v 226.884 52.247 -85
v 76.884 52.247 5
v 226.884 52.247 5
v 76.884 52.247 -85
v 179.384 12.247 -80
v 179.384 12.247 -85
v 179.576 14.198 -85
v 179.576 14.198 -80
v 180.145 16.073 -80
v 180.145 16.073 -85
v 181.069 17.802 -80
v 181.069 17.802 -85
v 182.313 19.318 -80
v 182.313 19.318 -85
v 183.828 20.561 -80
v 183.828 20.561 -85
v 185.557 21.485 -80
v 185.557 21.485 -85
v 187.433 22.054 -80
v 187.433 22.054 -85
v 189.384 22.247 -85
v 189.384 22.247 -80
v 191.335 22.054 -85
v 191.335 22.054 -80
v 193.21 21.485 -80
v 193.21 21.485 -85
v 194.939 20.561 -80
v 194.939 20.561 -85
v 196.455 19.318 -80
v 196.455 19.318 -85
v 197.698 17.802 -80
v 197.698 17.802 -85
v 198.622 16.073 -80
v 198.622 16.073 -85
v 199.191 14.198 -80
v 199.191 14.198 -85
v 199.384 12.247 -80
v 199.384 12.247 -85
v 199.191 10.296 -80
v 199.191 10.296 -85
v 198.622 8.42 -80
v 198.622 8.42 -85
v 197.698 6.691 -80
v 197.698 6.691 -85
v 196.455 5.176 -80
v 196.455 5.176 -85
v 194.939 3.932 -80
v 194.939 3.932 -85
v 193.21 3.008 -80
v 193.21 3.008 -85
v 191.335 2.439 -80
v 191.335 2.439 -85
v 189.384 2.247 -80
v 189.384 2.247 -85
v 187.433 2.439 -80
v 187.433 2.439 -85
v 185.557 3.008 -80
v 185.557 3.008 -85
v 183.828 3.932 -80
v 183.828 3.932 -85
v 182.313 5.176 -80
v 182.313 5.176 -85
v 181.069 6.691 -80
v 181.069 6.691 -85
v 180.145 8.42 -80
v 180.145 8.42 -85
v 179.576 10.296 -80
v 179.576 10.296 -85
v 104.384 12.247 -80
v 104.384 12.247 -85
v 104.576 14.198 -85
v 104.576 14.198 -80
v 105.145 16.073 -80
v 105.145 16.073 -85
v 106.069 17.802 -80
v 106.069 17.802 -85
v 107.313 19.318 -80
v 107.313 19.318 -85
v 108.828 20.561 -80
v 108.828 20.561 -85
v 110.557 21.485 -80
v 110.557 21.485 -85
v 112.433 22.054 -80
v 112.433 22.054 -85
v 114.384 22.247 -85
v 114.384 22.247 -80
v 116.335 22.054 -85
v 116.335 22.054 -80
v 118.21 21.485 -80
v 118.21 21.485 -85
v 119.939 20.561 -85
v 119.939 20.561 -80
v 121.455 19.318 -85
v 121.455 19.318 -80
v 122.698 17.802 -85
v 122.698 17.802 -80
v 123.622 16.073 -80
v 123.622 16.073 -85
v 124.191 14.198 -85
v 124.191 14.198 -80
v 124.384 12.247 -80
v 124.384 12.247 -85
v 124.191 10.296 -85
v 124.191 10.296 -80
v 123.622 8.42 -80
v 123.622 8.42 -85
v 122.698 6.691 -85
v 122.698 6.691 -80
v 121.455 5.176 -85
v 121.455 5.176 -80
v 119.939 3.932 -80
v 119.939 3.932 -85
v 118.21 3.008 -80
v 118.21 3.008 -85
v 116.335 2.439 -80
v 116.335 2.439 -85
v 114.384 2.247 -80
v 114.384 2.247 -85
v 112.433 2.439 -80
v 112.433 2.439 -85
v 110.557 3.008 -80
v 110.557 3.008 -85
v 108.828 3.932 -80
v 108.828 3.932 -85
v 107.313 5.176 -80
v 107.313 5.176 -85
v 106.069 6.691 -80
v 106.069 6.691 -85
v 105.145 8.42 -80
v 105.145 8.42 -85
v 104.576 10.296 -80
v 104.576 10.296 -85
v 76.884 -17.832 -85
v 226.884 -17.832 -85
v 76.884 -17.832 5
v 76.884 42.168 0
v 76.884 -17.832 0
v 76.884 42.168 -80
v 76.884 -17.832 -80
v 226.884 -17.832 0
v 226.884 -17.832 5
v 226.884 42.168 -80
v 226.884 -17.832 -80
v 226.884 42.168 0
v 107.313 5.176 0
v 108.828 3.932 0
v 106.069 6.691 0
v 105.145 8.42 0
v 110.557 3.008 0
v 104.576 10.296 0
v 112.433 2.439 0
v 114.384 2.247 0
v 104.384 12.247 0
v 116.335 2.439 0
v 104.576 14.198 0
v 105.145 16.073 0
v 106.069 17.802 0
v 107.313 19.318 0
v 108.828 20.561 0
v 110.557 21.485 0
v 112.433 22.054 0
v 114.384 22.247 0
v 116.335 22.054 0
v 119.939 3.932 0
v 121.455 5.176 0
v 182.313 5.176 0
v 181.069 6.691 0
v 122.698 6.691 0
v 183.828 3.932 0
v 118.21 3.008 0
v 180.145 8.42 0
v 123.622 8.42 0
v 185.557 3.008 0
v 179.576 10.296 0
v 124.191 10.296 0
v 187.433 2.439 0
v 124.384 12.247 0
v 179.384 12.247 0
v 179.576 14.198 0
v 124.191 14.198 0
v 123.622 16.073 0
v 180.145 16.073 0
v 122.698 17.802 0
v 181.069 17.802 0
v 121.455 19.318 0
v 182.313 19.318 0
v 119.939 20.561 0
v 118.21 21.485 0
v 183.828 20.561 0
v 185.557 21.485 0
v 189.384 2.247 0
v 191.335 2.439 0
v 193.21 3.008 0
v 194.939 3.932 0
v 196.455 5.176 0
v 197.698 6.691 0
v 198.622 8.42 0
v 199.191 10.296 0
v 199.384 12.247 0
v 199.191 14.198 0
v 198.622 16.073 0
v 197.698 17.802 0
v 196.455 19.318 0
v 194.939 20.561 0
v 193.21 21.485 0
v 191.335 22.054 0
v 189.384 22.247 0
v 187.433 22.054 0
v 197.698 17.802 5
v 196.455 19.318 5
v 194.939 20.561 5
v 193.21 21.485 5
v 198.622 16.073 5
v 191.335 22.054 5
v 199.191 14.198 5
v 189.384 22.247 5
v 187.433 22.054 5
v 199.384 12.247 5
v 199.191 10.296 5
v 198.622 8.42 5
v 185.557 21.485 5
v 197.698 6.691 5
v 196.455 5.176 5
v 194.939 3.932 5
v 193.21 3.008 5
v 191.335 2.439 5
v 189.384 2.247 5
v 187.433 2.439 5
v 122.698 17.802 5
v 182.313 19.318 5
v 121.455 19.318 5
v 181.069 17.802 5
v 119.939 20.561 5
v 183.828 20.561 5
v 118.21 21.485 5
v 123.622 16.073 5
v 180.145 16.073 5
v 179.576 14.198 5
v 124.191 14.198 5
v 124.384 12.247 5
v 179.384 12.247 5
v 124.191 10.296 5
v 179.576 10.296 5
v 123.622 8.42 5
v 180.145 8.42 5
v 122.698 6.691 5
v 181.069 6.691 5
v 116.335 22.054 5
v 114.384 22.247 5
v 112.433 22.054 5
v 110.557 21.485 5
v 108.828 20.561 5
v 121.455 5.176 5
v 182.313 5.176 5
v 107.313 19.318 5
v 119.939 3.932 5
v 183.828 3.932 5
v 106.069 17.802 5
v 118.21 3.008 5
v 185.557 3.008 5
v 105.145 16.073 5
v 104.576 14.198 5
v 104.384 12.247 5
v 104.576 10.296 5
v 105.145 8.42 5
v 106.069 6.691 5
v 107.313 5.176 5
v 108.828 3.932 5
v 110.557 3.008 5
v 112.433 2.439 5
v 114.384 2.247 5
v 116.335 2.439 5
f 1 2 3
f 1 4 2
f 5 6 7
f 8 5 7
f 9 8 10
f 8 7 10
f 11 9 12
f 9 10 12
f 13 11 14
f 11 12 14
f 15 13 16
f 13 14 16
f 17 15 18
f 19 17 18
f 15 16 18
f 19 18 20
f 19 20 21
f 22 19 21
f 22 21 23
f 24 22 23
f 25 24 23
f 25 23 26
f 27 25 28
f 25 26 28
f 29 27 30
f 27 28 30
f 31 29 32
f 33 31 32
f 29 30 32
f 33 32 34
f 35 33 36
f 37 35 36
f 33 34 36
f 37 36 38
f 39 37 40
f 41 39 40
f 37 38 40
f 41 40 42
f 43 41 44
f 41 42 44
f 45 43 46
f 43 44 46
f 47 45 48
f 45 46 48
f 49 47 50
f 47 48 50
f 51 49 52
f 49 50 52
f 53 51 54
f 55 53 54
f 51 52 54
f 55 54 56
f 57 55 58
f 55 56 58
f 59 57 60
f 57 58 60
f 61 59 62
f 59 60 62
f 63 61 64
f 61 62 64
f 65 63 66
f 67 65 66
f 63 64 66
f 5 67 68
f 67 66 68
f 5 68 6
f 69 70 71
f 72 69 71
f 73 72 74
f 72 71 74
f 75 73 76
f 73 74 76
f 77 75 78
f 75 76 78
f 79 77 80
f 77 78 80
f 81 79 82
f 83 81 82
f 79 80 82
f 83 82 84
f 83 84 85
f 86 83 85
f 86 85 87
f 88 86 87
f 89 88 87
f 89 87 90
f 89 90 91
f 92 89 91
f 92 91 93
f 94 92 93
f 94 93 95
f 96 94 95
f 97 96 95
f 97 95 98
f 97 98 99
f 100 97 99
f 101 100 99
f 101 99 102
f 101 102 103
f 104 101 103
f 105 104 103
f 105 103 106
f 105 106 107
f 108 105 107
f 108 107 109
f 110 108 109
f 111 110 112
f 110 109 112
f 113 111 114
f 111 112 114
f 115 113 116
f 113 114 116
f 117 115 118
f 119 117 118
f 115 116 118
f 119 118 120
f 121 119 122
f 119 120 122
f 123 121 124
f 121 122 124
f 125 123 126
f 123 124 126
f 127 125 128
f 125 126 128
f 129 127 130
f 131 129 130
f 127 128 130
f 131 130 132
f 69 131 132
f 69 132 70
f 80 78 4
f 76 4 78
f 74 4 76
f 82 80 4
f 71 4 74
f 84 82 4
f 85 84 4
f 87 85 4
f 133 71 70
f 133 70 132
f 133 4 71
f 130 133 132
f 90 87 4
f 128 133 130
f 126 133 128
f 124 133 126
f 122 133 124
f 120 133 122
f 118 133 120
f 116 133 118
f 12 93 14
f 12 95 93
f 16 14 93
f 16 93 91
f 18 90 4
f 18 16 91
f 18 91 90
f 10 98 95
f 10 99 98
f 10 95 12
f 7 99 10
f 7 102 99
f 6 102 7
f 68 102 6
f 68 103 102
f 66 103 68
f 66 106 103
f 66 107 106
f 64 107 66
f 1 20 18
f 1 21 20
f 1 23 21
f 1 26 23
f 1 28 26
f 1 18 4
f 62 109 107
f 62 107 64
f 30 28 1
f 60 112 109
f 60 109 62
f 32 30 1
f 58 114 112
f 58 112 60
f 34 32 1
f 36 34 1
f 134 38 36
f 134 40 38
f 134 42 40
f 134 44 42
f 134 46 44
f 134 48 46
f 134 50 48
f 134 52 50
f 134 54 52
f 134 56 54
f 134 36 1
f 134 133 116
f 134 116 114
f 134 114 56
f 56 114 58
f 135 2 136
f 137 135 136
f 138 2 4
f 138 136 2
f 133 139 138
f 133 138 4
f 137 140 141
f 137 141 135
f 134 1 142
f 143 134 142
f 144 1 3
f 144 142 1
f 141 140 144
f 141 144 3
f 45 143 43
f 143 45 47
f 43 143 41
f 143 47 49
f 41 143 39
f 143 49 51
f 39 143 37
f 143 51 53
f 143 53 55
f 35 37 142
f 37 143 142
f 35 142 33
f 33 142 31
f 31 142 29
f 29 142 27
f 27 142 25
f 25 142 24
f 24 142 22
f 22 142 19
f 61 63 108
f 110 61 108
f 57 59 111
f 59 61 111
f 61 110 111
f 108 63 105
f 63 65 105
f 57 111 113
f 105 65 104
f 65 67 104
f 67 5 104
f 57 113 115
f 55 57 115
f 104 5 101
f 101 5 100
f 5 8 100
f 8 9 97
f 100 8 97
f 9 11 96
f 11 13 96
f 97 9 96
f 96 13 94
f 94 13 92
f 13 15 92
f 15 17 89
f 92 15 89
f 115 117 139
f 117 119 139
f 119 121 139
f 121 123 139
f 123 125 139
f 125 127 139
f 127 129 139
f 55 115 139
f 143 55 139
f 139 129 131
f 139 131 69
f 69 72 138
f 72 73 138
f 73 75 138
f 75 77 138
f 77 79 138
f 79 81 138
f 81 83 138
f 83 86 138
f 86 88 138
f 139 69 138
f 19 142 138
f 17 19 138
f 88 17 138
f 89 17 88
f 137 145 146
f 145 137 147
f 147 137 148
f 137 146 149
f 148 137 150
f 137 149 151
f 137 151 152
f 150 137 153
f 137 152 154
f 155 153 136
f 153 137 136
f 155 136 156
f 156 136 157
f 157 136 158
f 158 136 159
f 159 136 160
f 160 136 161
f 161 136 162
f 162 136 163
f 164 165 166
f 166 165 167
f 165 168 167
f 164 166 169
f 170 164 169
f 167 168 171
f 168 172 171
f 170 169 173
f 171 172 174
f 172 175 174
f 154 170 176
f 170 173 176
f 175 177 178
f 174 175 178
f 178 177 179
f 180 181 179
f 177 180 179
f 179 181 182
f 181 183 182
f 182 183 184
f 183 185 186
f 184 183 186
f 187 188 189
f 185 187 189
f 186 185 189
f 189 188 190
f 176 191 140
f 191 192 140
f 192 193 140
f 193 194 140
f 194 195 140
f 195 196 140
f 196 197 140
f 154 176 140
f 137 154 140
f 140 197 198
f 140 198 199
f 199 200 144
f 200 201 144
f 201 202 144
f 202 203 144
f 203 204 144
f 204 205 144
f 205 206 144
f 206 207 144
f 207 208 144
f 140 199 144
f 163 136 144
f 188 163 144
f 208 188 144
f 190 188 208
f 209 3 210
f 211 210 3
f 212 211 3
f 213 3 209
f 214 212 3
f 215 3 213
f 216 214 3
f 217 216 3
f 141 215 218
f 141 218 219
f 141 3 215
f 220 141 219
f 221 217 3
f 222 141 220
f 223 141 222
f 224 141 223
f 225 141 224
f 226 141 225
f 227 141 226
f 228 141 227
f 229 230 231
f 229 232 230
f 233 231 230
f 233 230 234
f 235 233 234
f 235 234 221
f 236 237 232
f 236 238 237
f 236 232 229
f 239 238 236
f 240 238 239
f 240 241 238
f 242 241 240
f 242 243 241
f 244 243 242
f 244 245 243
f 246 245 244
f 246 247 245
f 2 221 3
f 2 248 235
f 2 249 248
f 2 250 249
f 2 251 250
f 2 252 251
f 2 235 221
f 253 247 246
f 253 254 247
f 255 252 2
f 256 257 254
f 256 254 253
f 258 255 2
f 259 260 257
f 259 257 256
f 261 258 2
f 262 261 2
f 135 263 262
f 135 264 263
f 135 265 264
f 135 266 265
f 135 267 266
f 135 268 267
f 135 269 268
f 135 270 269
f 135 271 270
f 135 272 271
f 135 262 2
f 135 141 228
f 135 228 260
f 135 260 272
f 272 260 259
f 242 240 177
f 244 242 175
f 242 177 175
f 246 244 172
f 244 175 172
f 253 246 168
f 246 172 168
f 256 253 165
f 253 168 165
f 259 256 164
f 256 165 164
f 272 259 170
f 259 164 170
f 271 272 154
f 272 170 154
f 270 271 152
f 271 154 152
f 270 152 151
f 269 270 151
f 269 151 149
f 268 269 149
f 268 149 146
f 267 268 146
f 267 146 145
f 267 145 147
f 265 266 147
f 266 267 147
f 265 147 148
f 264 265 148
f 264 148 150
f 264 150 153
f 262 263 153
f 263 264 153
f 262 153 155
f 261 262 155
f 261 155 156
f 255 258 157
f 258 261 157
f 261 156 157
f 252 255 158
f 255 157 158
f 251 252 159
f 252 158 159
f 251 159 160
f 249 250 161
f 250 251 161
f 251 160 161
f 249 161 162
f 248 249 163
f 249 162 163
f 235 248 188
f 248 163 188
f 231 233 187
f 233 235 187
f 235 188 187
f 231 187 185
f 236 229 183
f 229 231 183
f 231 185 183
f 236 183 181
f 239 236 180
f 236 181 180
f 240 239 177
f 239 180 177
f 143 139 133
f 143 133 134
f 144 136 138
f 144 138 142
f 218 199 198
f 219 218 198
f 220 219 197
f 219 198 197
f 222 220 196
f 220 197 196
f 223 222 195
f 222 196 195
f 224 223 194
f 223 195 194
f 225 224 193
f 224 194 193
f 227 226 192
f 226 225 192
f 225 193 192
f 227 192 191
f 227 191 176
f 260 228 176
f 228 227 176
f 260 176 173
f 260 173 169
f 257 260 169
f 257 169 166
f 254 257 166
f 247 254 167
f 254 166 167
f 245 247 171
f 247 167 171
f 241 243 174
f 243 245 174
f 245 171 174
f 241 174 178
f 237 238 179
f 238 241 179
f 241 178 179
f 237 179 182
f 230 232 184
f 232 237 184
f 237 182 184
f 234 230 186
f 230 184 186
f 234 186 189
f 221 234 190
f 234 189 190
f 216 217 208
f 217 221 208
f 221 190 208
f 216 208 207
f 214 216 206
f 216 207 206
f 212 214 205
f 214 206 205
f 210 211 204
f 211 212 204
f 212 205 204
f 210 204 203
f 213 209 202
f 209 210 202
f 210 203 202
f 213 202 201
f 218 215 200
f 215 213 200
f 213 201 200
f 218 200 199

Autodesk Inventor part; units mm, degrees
ref_plane "YZ Plane" through (0, 0, 0) normal (1, 0, 0) x (0, 1, 0)
ref_plane "XZ Plane" through (0, 0, 0) normal (0, 1, 0) x (-1, 0, 0)
ref_plane "XY Plane" through (0, 0, 0) normal (0, 0, 1) x (1, 0, 0)
ref_plane "Work Plane1" through (0, 0, 0) normal (0, 0, 1) x (1, 0, 0)
sketch "Sketch1" plane through (0, 0, 0) normal (0, 0, 1) x (1, 0, 0)
  circle A0 centre (114.3836, 12.2466) radius 10 projected
  circle A1 centre (114.3836, 12.2466) radius 10 projected
  line L0 (114.3836, 12.2466) -> (76.8836, 12.2466)
  line L1 (124.7866, -536.2038) -> (-25.2134, -536.2038) projected
  line L2 (114.3836, 12.2466) -> (114.3836, -536.2038)
  line L3 (76.8836, 12.2466) -> (76.8836, 52.1676)
  line L4 (76.8836, 52.1676) -> (226.8836, 52.1676)
  line L5 (226.8836, 52.1676) -> (226.8836, -17.8324)
  line L6 (226.8836, -17.8324) -> (76.8836, -17.8324)
  line L7 (76.8836, -17.8324) -> (76.8836, 12.2466)
  circle A2 centre (114.3836, 12.2466) radius 10 projected
  line L8 (151.8836, 52.1676) -> (151.8836, -17.8324)
  circle A3 centre (189.3836, 12.2466) radius 10
  line L9 (76.8836, 52.1676) -> (76.8836, 42.1676)
  line L10 (76.8836, 42.1676) -> (226.8836, 42.1676)
  line L11 (226.8836, 52.1676) -> (76.8836, 52.1676)
  line L12 (76.8836, 52.1676) -> (76.8836, 42.1676)
  line L13 (76.8836, 42.1676) -> (226.8836, 42.1676)
  line L14 (226.8836, 42.1676) -> (226.8836, 52.1676)
  point P0 (0, 0)
  dimension "d0" = 37.5
  dimension "d1" = 548.4504
  dimension "d2" = 39.921
  dimension "d3" = 150
  dimension "d4" = 70
  dimension "d5" = 10
  dimension "d6" = 150
extrude "Extrusion1" add sketch "Sketch1" along normal blind 5 contours A0 L0 L3 L10 L8 L6 L2 | A0 L2 L6 L7 L0 | L3 L4 L8 L10 | L8 L10 L5 L6 | L8 L4 L5 L10
sketch "Sketch3" plane through (0, 0, 0) normal (0, 0, -1) x (-1, 0, 0)
  line L0 (-226.8836, 52.1676) -> (-76.8836, 52.1676) projected
  line L1 (-76.8836, 42.1676) -> (-226.8836, 42.1676) projected
  line L2 (-226.8836, 52.1676) -> (-76.8836, 52.1676)
  line L3 (-76.8836, 52.1676) -> (-76.8836, 42.1676)
  line L4 (-76.8836, 42.1676) -> (-226.8836, 42.1676)
  line L5 (-226.8836, 42.1676) -> (-226.8836, 52.1676)
  point P0 (0, 0)
extrude "Extrusion2" add sketch "Sketch3" along normal blind 80
sketch "Sketch4" plane through (0, 0, -80) normal (0, 0, -1) x (-1, 0, 0)
  line L0 (-226.8836, 52.1676) -> (-76.8836, 52.1676) projected
  line L1 (-76.8836, -17.8324) -> (-226.8836, -17.8324) projected
  line L2 (-226.8836, 52.1676) -> (-76.8836, 52.1676)
  line L3 (-76.8836, 52.1676) -> (-76.8836, -17.8324)
  line L4 (-76.8836, -17.8324) -> (-226.8836, -17.8324)
  line L5 (-226.8836, -17.8324) -> (-226.8836, 52.1676)
  point P0 (0, 0)
  point P1 (-76.8836, 52.1676)
extrude "Extrusion3" add sketch "Sketch4" along normal blind 5
sketch "Sketch6" plane through (0, 0, -85) normal (0, 0, -1) x (-1, 0, 0)
  line L0 (-98.3957, 24.2628) -> (62.6208, -189.9747) projected
  arc A0 (-98.3957, 24.2628) -> (-130.3715, 0.2304) centre (-114.3836, 12.2466) ccw projected
  line L1 (30.6451, -214.007) -> (-130.3715, 0.2304) projected
  arc A1 (30.6451, -214.007) -> (62.6208, -189.9747) centre (46.6329, -201.9908) ccw projected
  circle A2 centre (46.6329, -201.9908) radius 9.25 projected
  circle A3 centre (-114.3836, 12.2466) radius 10 projected
  circle A4 centre (-189.3836, 12.2466) radius 10 projected
  point P0 (0, 0)
extrude "Extrusion4" cut sketch "Sketch6" against normal blind 10 contours A3 | A4
sketch "Sketch8" plane through (76.8836, 52.1676, 5) normal (0, 1, 0) x (1, 0, 0)
  line L0 (0, 0) -> (0, 90) projected
  line L1 (150, 0) -> (0, 0) projected
  line L2 (150, 90) -> (150, 0) projected
  line L3 (0, 90) -> (150, 90) projected
  point P0 (-76.8836, 5)
extrude "Extrusion6" add sketch "Sketch8" along normal blind 0.079
properties part number "korona"
